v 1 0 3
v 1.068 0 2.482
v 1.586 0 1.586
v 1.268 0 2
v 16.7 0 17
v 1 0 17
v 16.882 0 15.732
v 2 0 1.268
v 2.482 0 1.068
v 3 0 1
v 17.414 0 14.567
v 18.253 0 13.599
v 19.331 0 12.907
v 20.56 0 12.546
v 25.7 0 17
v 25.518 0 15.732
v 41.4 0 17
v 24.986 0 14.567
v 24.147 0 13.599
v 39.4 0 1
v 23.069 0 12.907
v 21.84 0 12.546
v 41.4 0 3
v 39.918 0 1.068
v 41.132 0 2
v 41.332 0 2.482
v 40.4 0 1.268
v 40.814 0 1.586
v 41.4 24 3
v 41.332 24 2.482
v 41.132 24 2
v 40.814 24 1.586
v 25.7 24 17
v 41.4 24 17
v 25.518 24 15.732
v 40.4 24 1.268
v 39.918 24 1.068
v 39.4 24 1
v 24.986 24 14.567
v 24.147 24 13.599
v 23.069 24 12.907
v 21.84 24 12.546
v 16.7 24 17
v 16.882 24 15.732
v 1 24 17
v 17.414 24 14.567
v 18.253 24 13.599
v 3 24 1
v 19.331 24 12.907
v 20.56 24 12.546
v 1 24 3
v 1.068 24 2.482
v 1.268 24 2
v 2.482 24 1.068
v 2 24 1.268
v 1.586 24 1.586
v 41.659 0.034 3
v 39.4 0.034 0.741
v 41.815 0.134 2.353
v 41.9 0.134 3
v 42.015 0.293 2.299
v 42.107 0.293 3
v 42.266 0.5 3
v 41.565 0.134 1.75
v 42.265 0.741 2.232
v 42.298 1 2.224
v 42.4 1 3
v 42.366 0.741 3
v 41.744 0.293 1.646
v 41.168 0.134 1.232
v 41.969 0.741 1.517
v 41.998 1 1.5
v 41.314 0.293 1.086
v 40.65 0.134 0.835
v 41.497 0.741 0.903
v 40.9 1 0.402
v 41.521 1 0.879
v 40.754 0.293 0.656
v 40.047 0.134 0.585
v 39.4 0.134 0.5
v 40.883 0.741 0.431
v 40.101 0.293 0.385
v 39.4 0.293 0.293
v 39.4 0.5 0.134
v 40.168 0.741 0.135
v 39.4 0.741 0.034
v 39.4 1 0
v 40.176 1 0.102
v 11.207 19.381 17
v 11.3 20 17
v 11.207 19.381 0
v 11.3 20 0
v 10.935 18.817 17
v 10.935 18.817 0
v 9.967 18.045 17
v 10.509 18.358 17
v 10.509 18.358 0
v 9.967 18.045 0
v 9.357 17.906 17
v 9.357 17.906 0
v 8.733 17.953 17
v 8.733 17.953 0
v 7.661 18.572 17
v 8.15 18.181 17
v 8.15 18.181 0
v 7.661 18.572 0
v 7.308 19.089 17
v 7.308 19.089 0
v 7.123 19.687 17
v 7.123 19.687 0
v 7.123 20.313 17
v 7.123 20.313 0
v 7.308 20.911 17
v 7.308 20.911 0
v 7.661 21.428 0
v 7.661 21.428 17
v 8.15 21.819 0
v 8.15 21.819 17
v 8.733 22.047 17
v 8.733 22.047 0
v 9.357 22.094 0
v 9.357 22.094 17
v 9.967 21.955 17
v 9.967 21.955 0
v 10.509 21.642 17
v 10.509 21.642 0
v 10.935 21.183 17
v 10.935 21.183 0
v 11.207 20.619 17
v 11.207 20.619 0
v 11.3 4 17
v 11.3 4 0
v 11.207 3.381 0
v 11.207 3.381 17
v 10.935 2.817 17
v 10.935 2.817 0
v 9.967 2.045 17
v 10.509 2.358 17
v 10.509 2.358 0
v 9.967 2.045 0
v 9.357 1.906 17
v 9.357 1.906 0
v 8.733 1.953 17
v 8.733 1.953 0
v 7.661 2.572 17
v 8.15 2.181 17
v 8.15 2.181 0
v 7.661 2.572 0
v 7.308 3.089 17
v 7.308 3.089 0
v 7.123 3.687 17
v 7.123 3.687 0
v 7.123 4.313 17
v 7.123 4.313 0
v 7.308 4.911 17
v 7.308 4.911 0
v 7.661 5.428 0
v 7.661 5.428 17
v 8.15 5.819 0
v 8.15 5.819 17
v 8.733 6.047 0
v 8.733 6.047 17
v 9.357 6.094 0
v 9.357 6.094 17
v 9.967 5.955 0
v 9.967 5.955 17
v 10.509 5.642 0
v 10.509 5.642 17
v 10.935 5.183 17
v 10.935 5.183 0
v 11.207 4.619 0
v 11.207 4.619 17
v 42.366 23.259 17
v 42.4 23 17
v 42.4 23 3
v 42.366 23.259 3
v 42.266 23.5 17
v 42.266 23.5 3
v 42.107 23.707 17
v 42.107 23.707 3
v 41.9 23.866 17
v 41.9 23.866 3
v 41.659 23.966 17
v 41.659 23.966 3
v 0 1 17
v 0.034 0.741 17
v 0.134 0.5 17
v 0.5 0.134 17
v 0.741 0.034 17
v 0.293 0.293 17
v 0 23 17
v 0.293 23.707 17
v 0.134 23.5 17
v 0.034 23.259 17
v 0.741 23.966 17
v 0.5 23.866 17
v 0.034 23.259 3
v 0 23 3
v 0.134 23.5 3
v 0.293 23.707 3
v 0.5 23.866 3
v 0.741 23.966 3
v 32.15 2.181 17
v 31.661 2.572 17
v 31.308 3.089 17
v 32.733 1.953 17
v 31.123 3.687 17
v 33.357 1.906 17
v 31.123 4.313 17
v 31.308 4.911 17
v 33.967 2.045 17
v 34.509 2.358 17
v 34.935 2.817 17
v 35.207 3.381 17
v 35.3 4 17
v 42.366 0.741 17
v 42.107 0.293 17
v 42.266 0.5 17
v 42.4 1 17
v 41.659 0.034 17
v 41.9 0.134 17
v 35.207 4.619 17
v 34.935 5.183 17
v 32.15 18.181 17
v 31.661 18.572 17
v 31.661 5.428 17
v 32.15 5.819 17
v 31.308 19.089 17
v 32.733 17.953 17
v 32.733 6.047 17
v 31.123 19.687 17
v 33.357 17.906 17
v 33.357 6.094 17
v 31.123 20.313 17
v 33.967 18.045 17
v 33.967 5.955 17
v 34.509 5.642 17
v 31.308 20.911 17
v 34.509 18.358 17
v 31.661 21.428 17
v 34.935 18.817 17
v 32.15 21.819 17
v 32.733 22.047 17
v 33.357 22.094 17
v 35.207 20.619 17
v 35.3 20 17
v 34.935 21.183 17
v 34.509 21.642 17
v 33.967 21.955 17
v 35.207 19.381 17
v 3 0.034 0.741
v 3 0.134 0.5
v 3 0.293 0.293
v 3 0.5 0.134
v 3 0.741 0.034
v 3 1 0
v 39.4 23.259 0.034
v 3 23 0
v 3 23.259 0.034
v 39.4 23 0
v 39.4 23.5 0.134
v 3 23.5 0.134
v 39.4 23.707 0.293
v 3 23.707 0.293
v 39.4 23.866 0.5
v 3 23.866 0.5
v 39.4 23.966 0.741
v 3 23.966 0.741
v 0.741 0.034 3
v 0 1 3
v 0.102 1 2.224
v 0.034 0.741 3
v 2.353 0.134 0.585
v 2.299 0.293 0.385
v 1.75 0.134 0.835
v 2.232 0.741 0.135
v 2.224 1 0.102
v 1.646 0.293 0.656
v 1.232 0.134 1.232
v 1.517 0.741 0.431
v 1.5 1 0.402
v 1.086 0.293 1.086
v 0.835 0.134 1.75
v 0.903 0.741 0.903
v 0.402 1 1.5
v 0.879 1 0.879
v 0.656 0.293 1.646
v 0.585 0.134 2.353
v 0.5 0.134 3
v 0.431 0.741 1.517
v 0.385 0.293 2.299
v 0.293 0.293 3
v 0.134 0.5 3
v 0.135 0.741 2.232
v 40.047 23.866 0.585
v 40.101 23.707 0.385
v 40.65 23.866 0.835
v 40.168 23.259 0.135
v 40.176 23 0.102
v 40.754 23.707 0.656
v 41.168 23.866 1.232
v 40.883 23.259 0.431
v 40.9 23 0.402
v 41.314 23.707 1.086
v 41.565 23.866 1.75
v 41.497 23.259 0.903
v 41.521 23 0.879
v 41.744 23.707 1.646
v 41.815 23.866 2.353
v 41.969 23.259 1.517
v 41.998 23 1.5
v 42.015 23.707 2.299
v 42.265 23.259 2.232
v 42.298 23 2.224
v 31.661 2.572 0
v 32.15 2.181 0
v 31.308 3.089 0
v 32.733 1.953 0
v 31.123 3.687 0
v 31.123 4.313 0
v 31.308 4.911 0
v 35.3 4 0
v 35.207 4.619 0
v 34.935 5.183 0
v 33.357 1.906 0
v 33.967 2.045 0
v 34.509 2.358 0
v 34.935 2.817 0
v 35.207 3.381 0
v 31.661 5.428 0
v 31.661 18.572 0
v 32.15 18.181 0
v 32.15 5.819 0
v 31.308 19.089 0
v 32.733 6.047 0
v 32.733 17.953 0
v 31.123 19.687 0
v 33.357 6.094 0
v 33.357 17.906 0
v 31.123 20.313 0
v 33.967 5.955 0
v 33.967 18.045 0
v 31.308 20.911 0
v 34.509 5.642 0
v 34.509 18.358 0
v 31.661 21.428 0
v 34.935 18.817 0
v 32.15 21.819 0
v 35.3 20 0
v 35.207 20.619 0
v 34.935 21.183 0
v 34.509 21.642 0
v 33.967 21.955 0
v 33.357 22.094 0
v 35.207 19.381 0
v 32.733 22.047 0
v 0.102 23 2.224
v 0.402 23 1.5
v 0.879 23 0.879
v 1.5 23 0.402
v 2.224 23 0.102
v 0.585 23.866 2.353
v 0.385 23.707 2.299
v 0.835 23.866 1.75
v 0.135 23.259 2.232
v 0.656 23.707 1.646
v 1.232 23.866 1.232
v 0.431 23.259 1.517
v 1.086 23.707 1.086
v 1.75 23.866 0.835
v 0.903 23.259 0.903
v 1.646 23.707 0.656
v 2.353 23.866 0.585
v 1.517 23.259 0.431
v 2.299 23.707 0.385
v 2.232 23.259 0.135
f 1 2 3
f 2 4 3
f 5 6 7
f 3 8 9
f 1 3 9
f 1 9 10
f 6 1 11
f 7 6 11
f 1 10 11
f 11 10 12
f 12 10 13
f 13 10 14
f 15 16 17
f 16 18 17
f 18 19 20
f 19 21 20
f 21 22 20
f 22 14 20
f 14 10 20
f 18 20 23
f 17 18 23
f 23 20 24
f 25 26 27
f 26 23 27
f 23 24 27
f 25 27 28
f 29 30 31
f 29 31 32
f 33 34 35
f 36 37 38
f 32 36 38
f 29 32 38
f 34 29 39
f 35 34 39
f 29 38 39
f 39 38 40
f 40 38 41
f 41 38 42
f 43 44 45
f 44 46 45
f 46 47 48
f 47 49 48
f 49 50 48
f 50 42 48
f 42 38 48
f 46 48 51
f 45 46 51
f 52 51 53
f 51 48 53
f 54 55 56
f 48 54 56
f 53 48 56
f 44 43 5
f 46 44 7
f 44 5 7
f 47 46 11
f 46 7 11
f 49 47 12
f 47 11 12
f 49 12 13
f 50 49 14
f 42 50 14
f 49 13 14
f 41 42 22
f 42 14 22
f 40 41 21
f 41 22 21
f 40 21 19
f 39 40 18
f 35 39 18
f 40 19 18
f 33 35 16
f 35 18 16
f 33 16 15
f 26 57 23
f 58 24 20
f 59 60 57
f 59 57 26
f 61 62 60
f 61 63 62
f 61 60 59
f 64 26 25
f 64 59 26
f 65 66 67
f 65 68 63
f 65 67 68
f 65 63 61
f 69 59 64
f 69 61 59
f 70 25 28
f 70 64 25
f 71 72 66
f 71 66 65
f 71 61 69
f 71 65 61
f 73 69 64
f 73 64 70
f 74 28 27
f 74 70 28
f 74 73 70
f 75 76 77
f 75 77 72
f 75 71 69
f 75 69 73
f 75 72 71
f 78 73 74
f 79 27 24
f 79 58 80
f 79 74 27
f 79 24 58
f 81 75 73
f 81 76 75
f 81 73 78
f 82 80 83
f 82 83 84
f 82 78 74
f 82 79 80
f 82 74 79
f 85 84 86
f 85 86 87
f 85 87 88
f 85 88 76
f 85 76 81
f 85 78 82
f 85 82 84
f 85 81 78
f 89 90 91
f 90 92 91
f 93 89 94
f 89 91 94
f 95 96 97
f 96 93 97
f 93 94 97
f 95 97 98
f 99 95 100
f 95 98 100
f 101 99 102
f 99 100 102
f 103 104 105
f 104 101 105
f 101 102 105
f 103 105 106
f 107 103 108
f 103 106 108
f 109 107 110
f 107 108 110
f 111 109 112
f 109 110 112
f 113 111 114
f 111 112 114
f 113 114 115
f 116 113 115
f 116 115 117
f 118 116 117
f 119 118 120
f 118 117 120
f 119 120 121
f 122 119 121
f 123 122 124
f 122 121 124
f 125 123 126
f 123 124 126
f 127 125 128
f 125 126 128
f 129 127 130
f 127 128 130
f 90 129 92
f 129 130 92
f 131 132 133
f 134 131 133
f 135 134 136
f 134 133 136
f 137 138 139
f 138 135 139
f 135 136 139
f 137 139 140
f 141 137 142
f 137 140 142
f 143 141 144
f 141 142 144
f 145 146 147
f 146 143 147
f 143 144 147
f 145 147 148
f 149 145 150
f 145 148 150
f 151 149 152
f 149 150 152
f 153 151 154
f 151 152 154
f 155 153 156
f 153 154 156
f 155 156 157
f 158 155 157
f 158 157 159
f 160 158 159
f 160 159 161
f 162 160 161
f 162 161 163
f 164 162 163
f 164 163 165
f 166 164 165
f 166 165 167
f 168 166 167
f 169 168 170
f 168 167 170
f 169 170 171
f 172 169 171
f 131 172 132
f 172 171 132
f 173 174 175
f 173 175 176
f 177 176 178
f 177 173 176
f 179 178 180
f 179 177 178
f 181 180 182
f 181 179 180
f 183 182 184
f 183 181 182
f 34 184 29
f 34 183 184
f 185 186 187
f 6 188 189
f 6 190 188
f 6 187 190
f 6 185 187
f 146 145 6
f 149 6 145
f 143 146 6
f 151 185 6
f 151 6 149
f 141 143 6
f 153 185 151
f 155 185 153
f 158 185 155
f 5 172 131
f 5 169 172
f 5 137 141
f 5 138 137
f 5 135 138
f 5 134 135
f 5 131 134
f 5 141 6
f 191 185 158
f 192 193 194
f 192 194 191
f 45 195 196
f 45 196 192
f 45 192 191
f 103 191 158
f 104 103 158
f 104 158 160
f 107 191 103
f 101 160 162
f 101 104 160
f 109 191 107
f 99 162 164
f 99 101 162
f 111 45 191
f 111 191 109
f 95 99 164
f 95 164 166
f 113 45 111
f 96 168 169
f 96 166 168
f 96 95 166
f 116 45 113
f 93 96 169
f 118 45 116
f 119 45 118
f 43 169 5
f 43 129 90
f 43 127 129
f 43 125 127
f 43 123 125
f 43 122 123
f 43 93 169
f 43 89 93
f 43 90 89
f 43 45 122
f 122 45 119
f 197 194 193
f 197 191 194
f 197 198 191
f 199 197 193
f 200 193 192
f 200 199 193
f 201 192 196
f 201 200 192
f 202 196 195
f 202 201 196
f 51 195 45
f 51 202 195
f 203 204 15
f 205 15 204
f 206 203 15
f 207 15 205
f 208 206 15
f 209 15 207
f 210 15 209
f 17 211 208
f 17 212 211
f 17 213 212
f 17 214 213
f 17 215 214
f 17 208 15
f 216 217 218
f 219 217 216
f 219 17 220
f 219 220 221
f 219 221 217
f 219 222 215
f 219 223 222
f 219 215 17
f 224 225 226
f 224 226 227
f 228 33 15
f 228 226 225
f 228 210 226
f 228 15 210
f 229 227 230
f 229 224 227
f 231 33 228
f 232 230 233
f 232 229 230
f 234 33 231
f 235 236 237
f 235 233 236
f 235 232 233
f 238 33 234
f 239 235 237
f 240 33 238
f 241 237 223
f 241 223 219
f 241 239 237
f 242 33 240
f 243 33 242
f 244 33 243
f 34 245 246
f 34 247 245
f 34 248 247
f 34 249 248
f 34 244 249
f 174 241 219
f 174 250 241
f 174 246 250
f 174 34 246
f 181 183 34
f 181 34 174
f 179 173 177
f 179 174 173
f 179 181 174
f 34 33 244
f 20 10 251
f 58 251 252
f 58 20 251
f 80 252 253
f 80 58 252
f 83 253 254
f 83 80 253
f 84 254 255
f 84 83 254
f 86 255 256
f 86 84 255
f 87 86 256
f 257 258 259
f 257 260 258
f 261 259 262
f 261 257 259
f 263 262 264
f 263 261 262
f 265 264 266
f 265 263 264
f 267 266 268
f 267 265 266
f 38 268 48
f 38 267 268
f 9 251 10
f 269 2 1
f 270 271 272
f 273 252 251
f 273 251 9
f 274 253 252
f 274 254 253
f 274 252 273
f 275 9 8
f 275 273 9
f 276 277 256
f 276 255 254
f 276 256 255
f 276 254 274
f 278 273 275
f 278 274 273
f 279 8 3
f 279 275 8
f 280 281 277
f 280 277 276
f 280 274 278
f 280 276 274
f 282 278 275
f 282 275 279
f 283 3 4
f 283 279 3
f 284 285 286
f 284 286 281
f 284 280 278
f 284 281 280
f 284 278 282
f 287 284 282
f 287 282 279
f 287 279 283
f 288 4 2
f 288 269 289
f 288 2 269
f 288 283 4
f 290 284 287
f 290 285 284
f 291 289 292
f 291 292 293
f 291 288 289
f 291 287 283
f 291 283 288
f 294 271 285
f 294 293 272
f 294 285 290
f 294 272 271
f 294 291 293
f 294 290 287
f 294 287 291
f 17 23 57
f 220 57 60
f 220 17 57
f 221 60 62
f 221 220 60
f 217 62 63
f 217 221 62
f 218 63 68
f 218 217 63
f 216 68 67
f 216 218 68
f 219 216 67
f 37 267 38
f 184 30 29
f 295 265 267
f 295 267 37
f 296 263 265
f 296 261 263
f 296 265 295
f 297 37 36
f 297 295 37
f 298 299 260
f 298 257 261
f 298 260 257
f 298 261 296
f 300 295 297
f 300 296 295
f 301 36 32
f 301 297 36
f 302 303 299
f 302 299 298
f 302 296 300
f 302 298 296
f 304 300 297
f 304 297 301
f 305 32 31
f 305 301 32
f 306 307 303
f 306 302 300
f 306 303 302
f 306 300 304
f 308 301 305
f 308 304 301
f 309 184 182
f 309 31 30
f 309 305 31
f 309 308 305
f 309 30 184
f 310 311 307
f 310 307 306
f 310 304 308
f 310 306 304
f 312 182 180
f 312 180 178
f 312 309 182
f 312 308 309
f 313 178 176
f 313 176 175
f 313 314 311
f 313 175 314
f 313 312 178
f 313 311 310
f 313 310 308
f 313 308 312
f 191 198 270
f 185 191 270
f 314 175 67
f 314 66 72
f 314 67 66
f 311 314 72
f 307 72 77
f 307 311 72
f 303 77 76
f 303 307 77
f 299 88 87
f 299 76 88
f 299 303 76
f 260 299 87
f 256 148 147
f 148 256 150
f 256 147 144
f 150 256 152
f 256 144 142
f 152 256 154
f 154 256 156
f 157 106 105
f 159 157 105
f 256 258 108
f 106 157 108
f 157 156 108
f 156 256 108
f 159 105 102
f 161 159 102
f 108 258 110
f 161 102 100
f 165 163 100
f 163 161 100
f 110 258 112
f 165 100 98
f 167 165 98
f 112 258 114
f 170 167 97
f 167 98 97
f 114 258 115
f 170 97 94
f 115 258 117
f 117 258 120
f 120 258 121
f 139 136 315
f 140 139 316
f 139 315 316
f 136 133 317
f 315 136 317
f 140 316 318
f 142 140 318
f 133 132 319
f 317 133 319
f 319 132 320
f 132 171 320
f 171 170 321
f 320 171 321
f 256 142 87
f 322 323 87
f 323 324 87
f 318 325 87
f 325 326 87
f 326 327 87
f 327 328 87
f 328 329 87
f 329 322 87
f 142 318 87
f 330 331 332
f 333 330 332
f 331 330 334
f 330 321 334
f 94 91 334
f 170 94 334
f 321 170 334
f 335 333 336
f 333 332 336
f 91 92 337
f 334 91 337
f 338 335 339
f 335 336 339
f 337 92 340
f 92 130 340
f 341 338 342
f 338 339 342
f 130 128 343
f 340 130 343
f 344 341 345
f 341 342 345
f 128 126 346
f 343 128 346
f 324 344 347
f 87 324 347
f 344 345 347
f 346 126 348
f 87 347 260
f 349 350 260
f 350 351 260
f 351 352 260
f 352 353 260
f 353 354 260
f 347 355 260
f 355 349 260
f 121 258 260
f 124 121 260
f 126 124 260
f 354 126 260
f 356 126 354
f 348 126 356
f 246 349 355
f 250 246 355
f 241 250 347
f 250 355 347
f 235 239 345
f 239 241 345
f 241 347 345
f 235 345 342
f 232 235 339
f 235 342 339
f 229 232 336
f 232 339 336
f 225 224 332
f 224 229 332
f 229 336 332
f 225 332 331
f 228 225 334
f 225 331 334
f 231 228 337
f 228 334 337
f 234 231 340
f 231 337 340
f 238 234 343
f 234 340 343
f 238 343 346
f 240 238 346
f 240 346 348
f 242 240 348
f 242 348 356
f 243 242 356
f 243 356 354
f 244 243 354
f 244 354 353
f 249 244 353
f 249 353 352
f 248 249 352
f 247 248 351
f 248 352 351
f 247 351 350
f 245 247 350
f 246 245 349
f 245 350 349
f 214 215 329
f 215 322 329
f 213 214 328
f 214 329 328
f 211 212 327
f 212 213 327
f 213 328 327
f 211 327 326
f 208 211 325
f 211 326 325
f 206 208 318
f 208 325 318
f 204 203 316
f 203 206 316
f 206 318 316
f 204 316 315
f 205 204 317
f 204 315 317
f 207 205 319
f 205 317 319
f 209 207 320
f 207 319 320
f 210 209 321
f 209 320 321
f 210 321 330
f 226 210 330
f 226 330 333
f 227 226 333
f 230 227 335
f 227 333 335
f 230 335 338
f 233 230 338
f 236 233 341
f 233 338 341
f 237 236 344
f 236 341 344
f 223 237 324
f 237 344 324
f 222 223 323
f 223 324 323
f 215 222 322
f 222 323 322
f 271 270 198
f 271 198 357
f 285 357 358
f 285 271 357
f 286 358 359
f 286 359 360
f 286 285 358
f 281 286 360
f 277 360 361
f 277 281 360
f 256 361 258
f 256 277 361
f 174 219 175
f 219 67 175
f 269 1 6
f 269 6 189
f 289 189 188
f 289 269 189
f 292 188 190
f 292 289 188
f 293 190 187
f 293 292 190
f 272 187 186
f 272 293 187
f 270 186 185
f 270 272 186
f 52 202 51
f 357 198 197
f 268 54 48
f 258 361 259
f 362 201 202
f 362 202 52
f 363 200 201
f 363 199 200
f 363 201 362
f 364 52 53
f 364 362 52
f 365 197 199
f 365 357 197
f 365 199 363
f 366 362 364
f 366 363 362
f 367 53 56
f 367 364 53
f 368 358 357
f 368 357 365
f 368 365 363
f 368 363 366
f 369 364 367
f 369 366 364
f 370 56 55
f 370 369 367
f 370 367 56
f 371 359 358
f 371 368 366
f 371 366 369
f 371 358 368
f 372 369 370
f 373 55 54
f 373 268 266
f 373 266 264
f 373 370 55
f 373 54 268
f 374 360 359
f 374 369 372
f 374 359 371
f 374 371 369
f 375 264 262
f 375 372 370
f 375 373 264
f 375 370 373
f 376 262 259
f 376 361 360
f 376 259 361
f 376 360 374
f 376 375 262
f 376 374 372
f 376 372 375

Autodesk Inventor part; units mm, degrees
ref_plane "YZ Plane" through (0, 0, 0) normal (1, 0, 0) x (0, 1, 0)
ref_plane "XZ Plane" through (0, 0, 0) normal (0, 1, 0) x (-1, 0, 0)
ref_plane "XY Plane" through (0, 0, 0) normal (0, 0, 1) x (1, 0, 0)
sketch "Sketch1" plane through (0, 0, 0) normal (0, 0, 1) x (1, 0, 0)
  line L0 (0, 0) -> (42.4, 0)
  line L1 (42.4, 0) -> (42.4, 24)
  line L2 (42.4, 24) -> (0, 24)
  line L3 (0, 24) -> (0, 0)
  circle A0 centre (9.2, 20) radius 2.1
  circle A1 centre (33.2, 20) radius 2.1
  circle A2 centre (33.2, 4) radius 2.1
  circle A3 centre (9.2, 4) radius 2.1
  dimension "d0" = 24
  dimension "d1" = 42.4
  dimension "d2" = 4.2
  dimension "d3" = 9.2
  dimension "d4" = 9.2
  dimension "d5" = 9.2
  dimension "d6" = 9.2
  dimension "d7" = 4
  dimension "d8" = 4
  dimension "d9" = 4
  dimension "d10" = 4
extrude "Extrusion1" add sketch "Sketch1" along normal blind 17
sketch "Sketch2" plane through (0, 0, 0) normal (0, -1, 0) x (1, 0, 0)
  line L0 (42.4, 17) -> (0, 17) projected
  line L1 (0, 0) -> (0, 17) projected
  circle A0 centre (21.2, 17) radius 4.5
  dimension "d13" = 9
  dimension "d14" = 21.2
  dimension "d15" = 0
extrude "Extrusion2" cut sketch "Sketch2" against normal through all
sketch "Sketch3" plane through (0, 0, 0) normal (0, 0, -1) x (-1, 0, 0)
  arc A0 (-35.3, 4) -> (-35.3, 4) centre (-33.2, 4) ccw projected
  arc A1 (-11.3, 4) -> (-11.3, 4) centre (-9.2, 4) ccw projected
  circle A2 centre (-33.2, 20) radius 2.1 projected
  circle A3 centre (-9.2, 20) radius 2.1 projected
  circle A4 centre (-33.2, 20) radius 4.25
  circle A5 centre (-9.2, 20) radius 4.25
  circle A6 centre (-9.2, 4) radius 4.25
  circle A7 centre (-33.2, 4) radius 4.25
  point P0 (0, 0)
  dimension "d20" = 8.5
extrude "Extrusion3" [suppressed]
sketch "Sketch4" plane through (21.2, 0, 17) normal (0, -1, 0) x (1, 0, 0)
  line L0 (-26.3081, 1.9971) -> (24.247, 1.9971)
  line L1 (24.247, 1.9971) -> (24.247, -18.7305)
  line L2 (24.247, -18.7305) -> (-26.3081, -18.7305)
  line L3 (-26.3081, -18.7305) -> (-26.3081, 1.9971)
  point P0 (-21.2, -17)
extrude "Extrusion4" [suppressed]
fillet "Fillet3" radius 3 2 edges at (42.4, 12, 0) (0, 12, 0)
fillet "Fillet4" radius 1 10 edges at (41.5213, 24, 0.8787) (21.2, 24, 0) (42.4, 24, 10) (0.8787, 24, 0.8787) (0, 24, 10) (41.5213, 0, 0.8787) (21.2, 0, 0) (42.4, 0, 10) (0, 0, 10) (0.8787, 0, 0.8787)
sketch "Sketch7" plane through (42.4, 1, 3) normal (1, 0, 0) x (0, 0, -1)
  line L0 (-14, 22) -> (-14, 0) projected
  circle A0 centre (-6.5, 11) radius 3
  line L1 (0, 23) -> (-14, 23) projected
  point P0 (3, -1)
  dimension "d35" = 12
  dimension "d36" = 6
  dimension "d37" = 7.5
extrude "Extrusion6" [suppressed]
properties part number "Z move clamp"
